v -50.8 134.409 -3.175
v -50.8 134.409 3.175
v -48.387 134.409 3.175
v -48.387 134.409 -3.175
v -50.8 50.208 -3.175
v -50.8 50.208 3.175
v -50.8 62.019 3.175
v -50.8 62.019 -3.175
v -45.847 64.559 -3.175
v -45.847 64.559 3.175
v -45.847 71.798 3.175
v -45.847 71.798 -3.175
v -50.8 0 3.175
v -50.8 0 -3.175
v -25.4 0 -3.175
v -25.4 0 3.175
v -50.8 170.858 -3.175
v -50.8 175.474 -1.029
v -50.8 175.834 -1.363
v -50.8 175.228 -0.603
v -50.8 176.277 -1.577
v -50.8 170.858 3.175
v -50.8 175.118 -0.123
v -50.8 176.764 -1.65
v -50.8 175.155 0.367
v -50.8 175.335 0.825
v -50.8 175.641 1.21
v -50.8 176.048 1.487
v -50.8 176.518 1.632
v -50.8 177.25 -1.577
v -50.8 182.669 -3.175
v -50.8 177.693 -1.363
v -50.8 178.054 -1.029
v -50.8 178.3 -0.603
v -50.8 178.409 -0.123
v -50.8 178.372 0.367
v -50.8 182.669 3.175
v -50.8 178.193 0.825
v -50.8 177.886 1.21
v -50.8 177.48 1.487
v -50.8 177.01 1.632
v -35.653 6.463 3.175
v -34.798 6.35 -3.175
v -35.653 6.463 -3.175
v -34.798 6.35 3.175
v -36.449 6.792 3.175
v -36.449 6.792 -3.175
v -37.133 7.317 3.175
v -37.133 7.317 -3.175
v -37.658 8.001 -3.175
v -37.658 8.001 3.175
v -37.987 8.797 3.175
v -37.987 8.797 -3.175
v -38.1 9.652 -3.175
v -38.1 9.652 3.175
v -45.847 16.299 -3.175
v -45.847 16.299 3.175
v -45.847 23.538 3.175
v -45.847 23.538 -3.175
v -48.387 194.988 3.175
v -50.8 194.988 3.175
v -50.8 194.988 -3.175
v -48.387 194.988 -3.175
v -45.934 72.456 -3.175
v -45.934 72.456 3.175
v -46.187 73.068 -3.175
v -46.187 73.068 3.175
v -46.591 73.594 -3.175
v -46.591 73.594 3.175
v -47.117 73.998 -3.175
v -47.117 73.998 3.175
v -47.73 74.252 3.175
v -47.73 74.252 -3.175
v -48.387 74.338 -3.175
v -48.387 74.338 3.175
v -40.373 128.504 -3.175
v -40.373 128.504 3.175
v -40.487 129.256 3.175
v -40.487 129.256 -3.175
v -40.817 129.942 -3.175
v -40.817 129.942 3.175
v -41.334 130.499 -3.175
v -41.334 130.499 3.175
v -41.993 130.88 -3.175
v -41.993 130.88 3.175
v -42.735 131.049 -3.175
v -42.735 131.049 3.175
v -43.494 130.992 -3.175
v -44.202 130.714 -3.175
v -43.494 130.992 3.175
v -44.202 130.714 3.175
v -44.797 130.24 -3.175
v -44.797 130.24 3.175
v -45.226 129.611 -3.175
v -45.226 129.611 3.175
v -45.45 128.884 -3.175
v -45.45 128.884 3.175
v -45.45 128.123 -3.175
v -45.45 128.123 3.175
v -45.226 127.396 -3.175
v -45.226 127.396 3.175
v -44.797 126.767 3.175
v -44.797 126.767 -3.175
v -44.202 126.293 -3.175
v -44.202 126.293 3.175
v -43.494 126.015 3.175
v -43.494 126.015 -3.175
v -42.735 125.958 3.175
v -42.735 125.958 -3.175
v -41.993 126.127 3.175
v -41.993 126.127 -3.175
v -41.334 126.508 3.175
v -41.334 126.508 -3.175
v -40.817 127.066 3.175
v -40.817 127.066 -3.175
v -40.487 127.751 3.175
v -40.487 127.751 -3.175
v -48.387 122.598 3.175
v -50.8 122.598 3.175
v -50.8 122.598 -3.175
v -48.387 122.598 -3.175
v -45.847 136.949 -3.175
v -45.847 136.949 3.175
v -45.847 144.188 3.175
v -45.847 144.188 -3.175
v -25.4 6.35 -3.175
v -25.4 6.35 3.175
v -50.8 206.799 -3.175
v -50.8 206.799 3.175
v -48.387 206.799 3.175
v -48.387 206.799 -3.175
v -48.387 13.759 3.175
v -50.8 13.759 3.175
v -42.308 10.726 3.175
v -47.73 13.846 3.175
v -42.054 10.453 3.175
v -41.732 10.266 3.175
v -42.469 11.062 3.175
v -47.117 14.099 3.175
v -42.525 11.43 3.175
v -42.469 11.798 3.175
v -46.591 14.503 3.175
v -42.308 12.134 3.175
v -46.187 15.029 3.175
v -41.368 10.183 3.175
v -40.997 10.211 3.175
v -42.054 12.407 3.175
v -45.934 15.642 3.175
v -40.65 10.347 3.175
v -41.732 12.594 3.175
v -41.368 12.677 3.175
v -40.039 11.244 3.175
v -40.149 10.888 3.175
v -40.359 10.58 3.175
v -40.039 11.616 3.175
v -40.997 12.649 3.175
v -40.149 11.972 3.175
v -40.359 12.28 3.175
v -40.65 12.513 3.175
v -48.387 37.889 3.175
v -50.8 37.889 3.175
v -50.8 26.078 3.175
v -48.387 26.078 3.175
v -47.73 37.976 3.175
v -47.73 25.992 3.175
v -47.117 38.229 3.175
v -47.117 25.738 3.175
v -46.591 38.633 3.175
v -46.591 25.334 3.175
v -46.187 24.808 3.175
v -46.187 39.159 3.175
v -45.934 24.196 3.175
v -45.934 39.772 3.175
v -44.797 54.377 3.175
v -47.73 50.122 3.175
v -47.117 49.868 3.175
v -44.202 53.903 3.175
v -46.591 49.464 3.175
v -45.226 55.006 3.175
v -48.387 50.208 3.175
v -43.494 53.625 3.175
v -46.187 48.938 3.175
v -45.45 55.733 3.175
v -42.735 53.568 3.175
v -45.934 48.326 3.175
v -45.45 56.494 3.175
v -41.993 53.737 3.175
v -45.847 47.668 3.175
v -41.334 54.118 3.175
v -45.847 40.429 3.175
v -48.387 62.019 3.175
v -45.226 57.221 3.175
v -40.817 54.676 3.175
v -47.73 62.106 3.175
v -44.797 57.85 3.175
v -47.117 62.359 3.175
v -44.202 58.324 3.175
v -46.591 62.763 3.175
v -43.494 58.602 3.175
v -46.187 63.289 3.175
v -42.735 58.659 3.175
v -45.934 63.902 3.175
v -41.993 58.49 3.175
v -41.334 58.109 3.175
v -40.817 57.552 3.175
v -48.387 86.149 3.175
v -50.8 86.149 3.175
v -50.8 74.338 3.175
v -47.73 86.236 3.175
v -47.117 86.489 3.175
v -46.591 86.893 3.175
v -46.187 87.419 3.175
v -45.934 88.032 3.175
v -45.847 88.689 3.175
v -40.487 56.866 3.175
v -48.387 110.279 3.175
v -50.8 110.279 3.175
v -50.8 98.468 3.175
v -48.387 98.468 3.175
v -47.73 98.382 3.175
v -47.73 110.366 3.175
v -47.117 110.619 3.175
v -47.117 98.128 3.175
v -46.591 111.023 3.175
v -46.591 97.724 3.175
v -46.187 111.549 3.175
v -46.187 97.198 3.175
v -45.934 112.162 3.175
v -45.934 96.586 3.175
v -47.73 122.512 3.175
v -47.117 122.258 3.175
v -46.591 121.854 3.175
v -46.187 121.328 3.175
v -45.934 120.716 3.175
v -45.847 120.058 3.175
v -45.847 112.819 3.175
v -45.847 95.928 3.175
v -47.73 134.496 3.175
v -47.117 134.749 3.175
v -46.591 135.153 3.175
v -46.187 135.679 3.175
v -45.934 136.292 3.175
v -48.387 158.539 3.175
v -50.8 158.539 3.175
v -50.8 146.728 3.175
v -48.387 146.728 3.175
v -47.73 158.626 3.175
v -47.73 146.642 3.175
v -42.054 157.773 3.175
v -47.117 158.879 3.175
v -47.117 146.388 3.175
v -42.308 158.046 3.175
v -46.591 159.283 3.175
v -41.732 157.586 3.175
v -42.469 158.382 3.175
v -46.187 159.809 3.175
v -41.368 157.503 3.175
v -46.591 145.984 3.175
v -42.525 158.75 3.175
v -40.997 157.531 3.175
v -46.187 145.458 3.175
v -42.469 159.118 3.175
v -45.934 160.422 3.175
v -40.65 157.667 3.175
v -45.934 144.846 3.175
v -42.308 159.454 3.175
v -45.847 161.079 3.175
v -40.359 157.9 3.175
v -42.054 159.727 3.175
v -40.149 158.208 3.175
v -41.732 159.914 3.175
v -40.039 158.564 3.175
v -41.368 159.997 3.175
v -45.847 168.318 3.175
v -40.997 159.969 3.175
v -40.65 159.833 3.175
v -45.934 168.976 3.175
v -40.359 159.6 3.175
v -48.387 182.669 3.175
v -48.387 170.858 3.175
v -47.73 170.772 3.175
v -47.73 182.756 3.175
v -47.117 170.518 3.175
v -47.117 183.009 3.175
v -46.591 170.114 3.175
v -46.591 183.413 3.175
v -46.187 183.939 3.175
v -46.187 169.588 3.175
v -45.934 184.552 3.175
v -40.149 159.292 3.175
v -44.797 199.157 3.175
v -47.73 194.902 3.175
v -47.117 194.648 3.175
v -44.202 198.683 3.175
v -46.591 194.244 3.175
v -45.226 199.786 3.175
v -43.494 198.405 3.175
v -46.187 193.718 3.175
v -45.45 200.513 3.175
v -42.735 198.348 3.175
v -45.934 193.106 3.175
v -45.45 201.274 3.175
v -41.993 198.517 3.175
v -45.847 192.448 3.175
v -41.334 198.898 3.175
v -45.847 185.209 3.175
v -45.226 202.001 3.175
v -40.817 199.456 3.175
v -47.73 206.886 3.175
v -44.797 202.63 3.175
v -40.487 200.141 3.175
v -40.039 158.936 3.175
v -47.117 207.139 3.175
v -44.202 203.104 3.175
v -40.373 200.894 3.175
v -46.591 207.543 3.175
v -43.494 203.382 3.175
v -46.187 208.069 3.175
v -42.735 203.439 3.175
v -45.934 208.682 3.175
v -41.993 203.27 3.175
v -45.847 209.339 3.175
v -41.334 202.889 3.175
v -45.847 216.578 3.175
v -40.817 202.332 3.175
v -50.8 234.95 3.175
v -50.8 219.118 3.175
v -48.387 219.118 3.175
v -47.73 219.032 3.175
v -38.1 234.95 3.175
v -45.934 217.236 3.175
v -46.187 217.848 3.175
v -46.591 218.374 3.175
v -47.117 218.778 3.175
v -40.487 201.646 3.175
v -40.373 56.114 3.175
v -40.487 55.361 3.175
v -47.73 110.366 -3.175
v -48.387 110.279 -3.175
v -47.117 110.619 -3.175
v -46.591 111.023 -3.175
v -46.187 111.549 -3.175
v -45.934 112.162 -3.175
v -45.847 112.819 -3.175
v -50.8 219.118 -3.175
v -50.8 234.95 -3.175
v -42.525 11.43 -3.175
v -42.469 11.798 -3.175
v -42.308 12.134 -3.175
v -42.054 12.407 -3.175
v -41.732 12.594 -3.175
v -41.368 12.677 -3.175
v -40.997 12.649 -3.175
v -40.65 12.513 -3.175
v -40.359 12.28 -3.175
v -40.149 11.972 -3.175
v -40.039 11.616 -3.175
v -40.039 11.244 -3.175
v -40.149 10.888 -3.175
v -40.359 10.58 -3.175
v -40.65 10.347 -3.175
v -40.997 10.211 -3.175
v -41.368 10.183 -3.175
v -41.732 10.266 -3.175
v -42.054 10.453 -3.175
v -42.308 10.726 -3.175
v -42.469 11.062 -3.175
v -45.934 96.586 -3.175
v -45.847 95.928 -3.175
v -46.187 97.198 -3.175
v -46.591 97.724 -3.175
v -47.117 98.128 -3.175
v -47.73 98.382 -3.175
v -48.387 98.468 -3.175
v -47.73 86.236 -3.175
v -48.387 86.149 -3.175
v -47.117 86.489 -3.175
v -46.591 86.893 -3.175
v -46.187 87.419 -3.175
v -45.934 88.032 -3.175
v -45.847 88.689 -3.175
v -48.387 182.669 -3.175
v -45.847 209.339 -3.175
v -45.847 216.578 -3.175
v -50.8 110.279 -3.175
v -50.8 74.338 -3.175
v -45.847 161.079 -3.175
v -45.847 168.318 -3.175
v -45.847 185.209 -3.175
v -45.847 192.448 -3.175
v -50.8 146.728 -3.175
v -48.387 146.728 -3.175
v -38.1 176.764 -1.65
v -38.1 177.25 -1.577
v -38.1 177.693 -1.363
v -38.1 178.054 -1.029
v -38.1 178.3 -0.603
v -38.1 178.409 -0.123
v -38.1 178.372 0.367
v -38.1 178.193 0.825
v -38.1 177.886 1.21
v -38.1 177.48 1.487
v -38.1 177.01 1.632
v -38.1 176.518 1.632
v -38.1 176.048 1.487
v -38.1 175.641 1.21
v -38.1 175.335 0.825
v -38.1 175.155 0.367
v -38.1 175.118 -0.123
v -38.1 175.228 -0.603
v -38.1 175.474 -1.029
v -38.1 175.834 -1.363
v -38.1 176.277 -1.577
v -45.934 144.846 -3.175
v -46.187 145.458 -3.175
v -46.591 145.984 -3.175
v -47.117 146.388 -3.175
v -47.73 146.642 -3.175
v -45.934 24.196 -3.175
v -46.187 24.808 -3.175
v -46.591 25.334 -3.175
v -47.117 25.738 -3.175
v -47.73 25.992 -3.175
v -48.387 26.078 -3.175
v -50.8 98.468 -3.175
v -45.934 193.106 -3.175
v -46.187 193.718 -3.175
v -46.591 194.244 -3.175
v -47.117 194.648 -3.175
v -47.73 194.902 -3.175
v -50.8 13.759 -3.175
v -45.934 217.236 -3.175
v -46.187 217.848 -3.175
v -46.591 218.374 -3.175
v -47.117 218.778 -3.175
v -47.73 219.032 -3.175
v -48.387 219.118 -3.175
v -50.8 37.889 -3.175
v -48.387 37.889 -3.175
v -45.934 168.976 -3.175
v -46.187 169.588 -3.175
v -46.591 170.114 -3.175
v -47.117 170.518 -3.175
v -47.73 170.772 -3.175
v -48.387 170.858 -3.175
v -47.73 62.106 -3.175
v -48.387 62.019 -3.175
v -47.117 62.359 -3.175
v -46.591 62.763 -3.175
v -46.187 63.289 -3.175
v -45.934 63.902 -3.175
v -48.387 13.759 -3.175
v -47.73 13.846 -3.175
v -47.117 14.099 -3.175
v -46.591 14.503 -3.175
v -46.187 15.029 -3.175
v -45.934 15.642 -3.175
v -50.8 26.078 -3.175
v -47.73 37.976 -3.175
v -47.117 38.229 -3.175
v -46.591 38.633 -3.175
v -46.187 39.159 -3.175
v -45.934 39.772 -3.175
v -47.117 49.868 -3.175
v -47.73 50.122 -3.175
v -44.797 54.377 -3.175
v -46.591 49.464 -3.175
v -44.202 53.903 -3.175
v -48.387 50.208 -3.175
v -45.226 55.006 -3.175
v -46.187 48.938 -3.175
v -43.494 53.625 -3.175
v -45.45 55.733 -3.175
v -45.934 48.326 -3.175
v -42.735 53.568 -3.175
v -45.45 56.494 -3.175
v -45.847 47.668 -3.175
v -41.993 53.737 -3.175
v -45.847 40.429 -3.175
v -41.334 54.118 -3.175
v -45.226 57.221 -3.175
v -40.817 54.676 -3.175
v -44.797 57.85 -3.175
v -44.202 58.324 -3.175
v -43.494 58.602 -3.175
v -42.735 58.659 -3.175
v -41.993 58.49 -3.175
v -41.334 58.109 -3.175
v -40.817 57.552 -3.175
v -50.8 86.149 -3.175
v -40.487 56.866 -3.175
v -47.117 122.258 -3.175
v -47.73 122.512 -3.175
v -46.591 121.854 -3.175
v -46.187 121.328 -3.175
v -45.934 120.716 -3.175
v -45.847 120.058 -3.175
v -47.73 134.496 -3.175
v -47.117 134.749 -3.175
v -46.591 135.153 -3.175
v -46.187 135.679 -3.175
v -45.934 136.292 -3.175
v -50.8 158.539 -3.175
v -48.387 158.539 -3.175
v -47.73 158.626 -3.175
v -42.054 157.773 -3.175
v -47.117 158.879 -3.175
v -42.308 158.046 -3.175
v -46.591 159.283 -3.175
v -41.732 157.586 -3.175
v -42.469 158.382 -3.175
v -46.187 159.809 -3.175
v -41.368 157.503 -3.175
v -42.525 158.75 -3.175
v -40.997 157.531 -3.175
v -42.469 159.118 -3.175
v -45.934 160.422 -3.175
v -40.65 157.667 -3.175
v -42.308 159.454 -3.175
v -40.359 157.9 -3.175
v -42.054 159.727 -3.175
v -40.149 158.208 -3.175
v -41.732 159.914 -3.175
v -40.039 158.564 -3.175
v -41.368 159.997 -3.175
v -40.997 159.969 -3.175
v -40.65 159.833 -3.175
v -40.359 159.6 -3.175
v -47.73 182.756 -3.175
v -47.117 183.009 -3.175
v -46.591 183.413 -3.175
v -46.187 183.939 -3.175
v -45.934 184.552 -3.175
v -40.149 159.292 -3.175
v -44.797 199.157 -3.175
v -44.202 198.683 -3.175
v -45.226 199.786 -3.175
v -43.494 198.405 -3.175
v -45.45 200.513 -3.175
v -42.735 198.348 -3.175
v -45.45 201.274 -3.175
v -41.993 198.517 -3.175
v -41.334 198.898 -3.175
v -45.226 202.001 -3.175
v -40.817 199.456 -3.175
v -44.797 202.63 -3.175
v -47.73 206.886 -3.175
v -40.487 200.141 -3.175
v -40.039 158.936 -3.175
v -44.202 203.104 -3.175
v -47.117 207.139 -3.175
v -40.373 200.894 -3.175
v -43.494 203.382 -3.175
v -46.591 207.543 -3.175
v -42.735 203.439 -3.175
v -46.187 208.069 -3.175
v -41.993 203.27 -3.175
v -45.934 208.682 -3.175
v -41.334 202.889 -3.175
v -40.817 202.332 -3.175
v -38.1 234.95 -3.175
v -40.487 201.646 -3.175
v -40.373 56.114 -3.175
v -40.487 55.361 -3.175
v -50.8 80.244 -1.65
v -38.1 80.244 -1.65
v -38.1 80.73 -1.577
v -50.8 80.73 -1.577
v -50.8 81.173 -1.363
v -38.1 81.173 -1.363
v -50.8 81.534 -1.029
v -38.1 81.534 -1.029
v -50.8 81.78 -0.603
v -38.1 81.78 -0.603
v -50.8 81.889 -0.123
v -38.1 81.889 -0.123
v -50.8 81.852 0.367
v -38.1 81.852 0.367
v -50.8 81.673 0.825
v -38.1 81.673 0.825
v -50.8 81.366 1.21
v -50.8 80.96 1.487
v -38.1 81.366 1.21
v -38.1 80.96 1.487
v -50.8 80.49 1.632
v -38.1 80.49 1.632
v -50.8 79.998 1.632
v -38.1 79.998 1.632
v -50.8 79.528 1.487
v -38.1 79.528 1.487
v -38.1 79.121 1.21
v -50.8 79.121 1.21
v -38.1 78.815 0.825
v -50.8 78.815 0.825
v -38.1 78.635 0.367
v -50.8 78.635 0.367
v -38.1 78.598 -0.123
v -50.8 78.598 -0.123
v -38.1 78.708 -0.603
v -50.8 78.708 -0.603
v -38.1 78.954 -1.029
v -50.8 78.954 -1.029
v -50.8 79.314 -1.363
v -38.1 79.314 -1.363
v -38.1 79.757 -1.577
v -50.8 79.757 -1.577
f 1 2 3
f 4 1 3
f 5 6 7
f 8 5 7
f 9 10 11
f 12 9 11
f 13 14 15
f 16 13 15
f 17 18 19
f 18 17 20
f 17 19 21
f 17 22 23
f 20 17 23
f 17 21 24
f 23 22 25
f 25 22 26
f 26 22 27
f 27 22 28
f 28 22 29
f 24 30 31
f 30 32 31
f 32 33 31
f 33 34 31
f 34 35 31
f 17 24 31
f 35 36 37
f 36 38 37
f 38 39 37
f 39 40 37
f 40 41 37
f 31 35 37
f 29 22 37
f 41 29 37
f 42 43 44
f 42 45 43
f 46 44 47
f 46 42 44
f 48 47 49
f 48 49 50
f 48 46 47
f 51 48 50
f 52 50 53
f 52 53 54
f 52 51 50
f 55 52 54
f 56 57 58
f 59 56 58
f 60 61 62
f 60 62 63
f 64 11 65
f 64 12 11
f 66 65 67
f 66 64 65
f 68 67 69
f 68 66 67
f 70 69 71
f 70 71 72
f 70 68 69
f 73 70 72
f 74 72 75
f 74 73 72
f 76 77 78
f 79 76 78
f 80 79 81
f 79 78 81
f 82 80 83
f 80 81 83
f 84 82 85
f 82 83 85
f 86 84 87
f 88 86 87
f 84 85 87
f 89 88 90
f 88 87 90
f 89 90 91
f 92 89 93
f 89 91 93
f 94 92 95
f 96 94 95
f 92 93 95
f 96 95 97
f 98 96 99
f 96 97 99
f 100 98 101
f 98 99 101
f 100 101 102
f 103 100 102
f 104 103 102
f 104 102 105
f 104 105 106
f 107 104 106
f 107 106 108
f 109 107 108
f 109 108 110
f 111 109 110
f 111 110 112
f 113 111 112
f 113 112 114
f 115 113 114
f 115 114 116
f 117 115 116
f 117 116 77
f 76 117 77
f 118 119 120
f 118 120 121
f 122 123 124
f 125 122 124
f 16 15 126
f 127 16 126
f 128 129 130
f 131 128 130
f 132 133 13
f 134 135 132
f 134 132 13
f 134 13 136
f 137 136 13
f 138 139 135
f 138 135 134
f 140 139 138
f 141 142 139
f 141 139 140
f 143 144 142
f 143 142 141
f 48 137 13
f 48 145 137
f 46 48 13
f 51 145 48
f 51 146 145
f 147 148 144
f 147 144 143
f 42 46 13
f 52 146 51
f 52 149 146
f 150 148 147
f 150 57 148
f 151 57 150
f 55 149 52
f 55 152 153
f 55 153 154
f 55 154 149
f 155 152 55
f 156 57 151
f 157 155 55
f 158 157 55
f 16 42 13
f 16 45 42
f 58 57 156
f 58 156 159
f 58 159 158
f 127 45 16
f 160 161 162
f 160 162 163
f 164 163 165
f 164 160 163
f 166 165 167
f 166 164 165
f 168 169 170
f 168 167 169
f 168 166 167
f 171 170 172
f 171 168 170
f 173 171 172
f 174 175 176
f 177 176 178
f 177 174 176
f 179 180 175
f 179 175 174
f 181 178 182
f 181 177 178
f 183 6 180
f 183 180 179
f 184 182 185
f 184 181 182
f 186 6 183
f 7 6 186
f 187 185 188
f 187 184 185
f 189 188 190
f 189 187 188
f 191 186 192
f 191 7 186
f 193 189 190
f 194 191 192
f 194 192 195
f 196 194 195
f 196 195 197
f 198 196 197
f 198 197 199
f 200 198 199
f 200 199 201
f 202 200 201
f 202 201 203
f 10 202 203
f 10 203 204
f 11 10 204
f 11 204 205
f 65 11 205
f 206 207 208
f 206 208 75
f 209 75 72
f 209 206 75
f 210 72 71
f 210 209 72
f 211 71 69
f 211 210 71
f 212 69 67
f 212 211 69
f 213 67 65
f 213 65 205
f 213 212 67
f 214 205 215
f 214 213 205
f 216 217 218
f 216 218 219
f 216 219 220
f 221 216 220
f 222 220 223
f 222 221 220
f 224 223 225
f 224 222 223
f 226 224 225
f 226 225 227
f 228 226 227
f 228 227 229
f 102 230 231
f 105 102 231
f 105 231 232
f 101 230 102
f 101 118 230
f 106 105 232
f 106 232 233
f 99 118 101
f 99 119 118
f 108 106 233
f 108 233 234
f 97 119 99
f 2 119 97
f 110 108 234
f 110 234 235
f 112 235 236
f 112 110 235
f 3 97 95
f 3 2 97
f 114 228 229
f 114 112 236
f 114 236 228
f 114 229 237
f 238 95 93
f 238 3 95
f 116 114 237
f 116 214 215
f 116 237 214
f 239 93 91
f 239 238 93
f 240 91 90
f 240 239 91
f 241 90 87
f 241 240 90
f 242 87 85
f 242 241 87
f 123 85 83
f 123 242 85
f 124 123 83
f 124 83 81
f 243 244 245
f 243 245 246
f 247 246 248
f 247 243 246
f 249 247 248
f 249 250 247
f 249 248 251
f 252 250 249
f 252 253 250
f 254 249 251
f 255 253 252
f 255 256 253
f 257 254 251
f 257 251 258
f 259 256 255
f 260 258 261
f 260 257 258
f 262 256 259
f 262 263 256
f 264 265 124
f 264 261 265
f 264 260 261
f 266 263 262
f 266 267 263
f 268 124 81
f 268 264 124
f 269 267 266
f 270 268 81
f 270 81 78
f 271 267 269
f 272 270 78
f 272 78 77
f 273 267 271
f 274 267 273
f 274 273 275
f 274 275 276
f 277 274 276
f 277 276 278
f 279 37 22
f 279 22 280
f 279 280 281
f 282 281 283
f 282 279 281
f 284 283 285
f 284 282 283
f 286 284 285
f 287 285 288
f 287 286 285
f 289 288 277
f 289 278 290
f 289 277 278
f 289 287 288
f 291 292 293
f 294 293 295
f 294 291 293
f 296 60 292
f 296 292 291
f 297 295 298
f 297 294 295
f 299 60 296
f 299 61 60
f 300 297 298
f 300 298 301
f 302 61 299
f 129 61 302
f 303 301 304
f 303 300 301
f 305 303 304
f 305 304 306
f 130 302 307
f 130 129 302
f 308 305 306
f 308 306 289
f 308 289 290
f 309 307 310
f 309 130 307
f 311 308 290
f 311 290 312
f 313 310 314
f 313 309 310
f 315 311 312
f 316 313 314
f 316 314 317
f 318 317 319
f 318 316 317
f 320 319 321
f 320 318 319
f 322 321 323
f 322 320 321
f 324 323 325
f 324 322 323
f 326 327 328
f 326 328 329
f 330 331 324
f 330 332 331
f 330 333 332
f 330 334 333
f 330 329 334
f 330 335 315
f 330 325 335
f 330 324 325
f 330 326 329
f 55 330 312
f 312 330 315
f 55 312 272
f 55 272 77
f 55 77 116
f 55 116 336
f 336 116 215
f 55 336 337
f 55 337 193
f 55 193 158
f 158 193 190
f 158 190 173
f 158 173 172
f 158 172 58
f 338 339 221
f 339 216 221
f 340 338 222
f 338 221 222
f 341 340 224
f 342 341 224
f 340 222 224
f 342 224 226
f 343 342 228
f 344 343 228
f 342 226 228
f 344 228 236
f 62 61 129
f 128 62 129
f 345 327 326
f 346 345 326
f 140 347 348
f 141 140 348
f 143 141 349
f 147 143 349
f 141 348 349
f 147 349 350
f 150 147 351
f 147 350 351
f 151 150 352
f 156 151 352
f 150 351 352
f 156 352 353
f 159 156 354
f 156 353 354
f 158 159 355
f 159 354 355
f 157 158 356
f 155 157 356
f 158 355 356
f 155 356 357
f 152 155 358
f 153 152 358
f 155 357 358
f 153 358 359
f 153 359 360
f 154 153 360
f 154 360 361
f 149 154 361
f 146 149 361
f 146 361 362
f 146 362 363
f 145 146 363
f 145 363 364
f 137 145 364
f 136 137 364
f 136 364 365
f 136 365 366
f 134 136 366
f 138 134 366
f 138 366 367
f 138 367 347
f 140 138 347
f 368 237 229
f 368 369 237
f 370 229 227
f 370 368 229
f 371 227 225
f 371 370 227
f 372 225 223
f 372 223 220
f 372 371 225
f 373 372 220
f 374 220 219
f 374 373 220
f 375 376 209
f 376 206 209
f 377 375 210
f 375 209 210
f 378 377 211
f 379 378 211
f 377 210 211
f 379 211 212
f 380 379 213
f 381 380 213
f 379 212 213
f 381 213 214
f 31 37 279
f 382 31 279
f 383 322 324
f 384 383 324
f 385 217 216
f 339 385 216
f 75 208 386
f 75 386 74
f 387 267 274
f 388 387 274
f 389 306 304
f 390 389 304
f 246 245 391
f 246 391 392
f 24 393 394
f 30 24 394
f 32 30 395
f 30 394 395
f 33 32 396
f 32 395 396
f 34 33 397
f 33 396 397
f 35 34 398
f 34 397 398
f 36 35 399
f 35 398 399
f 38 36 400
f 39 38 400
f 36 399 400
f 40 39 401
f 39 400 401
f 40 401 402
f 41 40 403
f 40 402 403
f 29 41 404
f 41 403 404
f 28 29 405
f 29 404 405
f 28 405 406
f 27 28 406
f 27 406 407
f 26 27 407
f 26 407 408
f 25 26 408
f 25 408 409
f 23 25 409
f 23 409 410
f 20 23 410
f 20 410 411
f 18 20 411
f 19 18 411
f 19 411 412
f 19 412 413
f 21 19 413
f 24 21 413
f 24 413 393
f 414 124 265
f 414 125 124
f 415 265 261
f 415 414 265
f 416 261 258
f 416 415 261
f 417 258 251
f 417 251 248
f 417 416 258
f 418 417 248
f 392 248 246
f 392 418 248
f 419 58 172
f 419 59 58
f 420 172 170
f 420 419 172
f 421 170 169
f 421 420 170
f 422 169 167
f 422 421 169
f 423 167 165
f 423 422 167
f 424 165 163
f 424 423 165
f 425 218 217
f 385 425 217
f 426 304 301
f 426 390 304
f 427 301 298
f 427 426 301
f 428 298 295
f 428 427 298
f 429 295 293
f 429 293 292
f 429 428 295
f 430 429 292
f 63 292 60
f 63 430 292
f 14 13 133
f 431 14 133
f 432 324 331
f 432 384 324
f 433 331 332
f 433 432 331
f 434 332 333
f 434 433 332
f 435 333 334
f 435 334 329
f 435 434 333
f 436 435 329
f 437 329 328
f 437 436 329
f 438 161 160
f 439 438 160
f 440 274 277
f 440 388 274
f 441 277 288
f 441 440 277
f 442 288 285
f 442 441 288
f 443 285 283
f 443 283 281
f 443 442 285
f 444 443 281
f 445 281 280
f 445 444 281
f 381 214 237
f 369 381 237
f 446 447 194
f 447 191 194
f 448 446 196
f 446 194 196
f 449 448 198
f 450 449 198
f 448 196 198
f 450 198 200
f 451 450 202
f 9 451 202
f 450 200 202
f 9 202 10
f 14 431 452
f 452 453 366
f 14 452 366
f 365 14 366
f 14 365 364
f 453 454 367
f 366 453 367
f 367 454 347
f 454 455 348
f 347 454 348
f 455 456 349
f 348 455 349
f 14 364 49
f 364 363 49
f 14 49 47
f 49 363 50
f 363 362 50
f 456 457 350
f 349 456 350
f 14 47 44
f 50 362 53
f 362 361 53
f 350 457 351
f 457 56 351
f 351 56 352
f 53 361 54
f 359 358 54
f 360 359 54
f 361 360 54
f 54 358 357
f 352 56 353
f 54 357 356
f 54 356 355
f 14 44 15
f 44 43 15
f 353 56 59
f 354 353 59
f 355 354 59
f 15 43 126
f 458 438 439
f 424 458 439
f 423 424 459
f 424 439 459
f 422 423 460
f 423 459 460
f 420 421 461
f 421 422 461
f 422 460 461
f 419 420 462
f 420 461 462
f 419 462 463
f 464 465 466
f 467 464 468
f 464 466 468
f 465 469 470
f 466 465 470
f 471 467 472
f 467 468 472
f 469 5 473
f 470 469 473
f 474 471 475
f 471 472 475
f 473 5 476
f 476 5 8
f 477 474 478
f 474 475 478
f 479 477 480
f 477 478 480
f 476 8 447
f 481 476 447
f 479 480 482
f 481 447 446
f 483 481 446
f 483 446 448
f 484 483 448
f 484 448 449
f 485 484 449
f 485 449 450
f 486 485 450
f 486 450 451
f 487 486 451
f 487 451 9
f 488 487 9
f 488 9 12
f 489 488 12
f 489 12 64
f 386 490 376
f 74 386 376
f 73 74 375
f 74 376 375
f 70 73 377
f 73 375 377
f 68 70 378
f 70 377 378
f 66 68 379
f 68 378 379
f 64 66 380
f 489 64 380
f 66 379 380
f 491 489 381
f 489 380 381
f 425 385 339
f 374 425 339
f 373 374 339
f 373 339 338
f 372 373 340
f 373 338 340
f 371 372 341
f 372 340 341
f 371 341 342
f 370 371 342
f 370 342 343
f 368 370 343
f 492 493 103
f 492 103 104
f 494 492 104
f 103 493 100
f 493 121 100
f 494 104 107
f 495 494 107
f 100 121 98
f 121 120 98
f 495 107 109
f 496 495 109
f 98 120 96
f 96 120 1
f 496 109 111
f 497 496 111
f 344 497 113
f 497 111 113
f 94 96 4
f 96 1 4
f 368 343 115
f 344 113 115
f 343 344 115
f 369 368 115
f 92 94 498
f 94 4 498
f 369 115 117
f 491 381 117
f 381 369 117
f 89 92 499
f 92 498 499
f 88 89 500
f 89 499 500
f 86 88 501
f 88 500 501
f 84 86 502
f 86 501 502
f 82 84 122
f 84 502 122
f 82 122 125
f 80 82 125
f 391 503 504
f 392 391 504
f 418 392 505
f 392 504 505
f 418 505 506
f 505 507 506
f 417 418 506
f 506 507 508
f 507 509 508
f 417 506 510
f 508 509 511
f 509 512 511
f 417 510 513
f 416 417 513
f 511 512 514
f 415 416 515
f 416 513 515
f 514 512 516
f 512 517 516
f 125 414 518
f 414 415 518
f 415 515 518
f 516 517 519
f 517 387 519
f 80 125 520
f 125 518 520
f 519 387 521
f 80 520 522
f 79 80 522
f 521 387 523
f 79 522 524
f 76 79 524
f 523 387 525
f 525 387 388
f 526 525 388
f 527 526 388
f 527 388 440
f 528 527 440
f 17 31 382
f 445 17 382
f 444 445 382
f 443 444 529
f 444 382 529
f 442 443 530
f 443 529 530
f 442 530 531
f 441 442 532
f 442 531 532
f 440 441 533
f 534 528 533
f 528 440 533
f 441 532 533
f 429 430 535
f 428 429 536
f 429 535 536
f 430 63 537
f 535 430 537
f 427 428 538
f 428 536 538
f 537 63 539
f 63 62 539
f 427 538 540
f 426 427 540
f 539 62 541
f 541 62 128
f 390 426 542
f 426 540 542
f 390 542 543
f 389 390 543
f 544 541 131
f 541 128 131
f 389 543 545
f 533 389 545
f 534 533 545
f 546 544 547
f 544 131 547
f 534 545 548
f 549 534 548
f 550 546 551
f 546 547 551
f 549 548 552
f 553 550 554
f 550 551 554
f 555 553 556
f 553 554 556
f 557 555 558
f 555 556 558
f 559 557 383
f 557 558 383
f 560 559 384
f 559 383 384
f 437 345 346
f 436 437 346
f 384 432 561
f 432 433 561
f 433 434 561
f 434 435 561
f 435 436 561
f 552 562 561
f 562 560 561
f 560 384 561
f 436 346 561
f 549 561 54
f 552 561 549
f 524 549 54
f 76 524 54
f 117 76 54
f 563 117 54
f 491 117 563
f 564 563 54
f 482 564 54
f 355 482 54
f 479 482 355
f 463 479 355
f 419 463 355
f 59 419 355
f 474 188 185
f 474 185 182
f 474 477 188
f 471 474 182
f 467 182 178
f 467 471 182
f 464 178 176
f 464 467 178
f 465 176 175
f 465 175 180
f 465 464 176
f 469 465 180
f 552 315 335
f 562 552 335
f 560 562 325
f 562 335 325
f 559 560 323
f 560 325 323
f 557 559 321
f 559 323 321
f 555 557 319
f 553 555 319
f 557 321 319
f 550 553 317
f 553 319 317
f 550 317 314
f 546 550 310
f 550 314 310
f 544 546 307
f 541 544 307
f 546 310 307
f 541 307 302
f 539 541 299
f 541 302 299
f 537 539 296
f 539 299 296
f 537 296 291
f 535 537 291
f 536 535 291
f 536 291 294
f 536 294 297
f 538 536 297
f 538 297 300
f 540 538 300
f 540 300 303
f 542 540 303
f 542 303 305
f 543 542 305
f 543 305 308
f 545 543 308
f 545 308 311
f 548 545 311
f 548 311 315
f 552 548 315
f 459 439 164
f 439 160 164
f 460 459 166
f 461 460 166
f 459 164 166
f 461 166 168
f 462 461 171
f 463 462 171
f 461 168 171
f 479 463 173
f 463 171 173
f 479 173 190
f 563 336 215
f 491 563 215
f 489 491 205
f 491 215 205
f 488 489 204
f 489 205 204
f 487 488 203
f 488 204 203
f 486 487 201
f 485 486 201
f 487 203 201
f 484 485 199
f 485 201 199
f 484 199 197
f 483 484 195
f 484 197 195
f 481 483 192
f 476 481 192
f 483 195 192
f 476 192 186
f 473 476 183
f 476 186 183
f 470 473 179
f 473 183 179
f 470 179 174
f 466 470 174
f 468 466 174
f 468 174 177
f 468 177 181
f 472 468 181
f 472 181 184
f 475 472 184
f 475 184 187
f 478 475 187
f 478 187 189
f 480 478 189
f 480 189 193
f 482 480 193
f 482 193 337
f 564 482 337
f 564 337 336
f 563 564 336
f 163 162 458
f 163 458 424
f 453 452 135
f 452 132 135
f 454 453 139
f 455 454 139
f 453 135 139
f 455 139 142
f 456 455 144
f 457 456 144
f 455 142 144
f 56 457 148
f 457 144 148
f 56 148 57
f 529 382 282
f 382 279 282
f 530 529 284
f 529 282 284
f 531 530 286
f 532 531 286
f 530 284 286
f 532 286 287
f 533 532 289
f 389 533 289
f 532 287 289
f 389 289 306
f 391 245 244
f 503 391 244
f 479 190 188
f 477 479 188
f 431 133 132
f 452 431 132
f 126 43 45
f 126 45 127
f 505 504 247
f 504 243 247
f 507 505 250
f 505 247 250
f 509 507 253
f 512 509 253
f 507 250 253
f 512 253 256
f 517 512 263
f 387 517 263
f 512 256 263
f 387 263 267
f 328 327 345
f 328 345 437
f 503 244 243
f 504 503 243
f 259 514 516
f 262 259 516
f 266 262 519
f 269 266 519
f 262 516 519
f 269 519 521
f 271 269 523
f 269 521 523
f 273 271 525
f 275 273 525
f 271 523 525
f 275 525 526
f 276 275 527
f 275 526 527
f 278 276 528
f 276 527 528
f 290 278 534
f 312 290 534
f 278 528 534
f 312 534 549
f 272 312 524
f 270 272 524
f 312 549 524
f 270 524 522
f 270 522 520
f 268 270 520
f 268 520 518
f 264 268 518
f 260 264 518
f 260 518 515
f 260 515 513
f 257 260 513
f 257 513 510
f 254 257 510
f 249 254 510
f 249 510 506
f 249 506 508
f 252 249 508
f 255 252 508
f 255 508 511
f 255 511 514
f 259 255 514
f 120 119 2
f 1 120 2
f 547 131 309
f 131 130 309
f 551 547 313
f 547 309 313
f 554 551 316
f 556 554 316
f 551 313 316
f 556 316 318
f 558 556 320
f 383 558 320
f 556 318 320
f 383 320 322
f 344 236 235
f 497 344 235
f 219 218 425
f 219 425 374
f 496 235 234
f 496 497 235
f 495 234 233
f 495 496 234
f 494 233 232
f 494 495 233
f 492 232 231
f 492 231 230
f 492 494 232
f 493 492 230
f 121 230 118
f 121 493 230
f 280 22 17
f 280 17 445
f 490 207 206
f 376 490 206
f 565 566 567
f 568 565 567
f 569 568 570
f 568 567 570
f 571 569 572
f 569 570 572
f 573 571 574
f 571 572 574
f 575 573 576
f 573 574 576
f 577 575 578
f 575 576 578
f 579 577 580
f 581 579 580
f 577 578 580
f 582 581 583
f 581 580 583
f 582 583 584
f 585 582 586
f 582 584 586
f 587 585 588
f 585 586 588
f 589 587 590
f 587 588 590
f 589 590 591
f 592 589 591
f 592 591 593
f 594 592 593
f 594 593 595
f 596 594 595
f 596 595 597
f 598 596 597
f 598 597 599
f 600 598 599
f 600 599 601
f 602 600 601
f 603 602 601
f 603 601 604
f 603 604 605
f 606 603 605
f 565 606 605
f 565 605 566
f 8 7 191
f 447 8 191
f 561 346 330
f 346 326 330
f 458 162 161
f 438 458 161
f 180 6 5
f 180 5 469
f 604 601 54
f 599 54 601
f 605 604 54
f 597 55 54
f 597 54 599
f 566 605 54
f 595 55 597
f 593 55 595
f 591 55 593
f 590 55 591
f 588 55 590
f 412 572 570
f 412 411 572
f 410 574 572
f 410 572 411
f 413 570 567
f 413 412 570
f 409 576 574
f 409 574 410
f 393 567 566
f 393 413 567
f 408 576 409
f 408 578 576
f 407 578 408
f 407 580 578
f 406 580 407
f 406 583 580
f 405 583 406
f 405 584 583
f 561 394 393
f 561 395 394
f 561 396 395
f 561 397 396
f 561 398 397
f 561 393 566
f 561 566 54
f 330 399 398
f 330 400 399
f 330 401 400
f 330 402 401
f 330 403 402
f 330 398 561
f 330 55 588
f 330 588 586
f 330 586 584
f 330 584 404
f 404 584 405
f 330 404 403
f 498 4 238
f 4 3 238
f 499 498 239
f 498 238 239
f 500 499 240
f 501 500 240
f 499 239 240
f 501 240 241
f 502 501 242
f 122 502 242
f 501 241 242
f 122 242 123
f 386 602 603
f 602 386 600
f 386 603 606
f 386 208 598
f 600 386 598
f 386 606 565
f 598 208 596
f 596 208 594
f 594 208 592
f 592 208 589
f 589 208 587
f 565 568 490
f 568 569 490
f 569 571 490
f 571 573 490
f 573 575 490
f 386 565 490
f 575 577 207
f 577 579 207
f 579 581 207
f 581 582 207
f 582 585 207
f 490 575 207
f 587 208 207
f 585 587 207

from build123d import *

# Parameters (mm, degrees)
SKETCH1_W              = 12.7
SKETCH1_H              = 234.95
BOSS_EXTRUDE1_DEPTH    = 3.175
SKETCH2_W              = 4.953
SKETCH2_H              = 12.319
CUT_EXTRUDE1_DEPTH     = 241.400131292
FILLET1_R              = 2.54
LPATTERN3_COUNT        = 9
LPATTERN3_PITCH        = 24.13
FILLET1_OF_LPATTERN3_R = 2.54
M4X0_7_TAPPED_HOLE1_D  = 3.3
BOSS_EXTRUDE2_START    = -3.175
SKETCH5_W              = 12.7
SKETCH5_H              = 6.35
BOSS_EXTRUDE2_DEPTH    = 6.35
M3X0_5_TAPPED_HOLE1_D  = 2.5
FILLET2_R              = 3.302
SKETCH8_R              = 2.5527
CUT_EXTRUDE2_DEPTH     = 241.463022105


with BuildPart() as part:
    # Sketch1 → Boss-Extrude1 (new, symmetric)
    with BuildSketch(Plane.XY):
        with Locations((-44.45, 117.475)):
            Rectangle(SKETCH1_W, SKETCH1_H)
    extrude(amount=BOSS_EXTRUDE1_DEPTH, both=True)

    # Sketch2 → Cut-Extrude1 (cut, symmetric)
    with BuildSketch(Plane.XY):
        with Locations((-48.3235, 19.91868)):
            Rectangle(SKETCH2_W, SKETCH2_H)
    cut_extrude1 = extrude(amount=CUT_EXTRUDE1_DEPTH, both=True, mode=Mode.SUBTRACT)

    # Fillet1
    fillet1_edges = [part.edges().sort_by_distance(p)[0] for p in [
        (-45.847, 26.07818, 0),
        (-45.847, 13.75918, 0),
    ]]
    fillet(fillet1_edges, radius=FILLET1_R)

    # LPattern3: Cut-Extrude1 ×9
    with Locations(*[(0, i * LPATTERN3_PITCH, 0) for i in range(1, LPATTERN3_COUNT)]):
        add(cut_extrude1, mode=Mode.SUBTRACT)

    # Fillet1 of LPattern3
    fillet1_of_lpattern3_edges = [part.edges().sort_by_distance(p)[0] for p in [
        (-45.847, 50.20818, 0),
        (-45.847, 37.88918, 0),
        (-45.847, 74.33818, 0),
        (-45.847, 62.01918, 0),
        (-45.847, 98.46818, 0),
        (-45.847, 86.14918, 0),
        (-45.847, 122.59818, 0),
        (-45.847, 110.27918, 0),
        (-45.847, 146.72818, 0),
        (-45.847, 134.40918, 0),
        (-45.847, 170.85818, 0),
        (-45.847, 158.53918, 0),
        (-45.847, 194.98818, 0),
        (-45.847, 182.66918, 0),
        (-45.847, 219.11818, 0),
        (-45.847, 206.79918, 0),
    ]]
    fillet(fillet1_of_lpattern3_edges, radius=FILLET1_OF_LPATTERN3_R)

    # M4x0.7 Tapped Hole1 (through all)
    with Locations(Plane.ZY.offset(50.8)):
        with Locations((0, 80.24368), (0, 176.76368)):
            Hole(M4X0_7_TAPPED_HOLE1_D / 2)

    # Sketch5 → Boss-Extrude2 (add)
    with BuildSketch(Plane.XY.offset(BOSS_EXTRUDE2_START)):
        with Locations((-31.75, 3.175)):
            Rectangle(SKETCH5_W, SKETCH5_H)
    extrude(amount=BOSS_EXTRUDE2_DEPTH)

    # M3x0.5 Tapped Hole1 (through all)
    with Locations(Plane.XY.offset(3.175)):
        with Locations((-41.275, 11.43), (-41.275, 158.75)):
            Hole(M3X0_5_TAPPED_HOLE1_D / 2)

    # Fillet2
    fillet2_edges = [part.edges().sort_by_distance(p)[0] for p in [
        (-38.1, 6.35, 0),
    ]]
    fillet(fillet2_edges, radius=FILLET2_R)

    # Sketch8 → Cut-Extrude2 (cut, through all)
    with BuildSketch(Plane.XY.offset(3.175)):
        with Locations((-42.926, 200.89368)):
            Circle(SKETCH8_R)
        with Locations((-42.926, 56.11368)):
            Circle(SKETCH8_R)
        with Locations((-42.926, 128.50368)):
            Circle(SKETCH8_R)
    extrude(amount=-CUT_EXTRUDE2_DEPTH, mode=Mode.SUBTRACT)


solid = part.part
